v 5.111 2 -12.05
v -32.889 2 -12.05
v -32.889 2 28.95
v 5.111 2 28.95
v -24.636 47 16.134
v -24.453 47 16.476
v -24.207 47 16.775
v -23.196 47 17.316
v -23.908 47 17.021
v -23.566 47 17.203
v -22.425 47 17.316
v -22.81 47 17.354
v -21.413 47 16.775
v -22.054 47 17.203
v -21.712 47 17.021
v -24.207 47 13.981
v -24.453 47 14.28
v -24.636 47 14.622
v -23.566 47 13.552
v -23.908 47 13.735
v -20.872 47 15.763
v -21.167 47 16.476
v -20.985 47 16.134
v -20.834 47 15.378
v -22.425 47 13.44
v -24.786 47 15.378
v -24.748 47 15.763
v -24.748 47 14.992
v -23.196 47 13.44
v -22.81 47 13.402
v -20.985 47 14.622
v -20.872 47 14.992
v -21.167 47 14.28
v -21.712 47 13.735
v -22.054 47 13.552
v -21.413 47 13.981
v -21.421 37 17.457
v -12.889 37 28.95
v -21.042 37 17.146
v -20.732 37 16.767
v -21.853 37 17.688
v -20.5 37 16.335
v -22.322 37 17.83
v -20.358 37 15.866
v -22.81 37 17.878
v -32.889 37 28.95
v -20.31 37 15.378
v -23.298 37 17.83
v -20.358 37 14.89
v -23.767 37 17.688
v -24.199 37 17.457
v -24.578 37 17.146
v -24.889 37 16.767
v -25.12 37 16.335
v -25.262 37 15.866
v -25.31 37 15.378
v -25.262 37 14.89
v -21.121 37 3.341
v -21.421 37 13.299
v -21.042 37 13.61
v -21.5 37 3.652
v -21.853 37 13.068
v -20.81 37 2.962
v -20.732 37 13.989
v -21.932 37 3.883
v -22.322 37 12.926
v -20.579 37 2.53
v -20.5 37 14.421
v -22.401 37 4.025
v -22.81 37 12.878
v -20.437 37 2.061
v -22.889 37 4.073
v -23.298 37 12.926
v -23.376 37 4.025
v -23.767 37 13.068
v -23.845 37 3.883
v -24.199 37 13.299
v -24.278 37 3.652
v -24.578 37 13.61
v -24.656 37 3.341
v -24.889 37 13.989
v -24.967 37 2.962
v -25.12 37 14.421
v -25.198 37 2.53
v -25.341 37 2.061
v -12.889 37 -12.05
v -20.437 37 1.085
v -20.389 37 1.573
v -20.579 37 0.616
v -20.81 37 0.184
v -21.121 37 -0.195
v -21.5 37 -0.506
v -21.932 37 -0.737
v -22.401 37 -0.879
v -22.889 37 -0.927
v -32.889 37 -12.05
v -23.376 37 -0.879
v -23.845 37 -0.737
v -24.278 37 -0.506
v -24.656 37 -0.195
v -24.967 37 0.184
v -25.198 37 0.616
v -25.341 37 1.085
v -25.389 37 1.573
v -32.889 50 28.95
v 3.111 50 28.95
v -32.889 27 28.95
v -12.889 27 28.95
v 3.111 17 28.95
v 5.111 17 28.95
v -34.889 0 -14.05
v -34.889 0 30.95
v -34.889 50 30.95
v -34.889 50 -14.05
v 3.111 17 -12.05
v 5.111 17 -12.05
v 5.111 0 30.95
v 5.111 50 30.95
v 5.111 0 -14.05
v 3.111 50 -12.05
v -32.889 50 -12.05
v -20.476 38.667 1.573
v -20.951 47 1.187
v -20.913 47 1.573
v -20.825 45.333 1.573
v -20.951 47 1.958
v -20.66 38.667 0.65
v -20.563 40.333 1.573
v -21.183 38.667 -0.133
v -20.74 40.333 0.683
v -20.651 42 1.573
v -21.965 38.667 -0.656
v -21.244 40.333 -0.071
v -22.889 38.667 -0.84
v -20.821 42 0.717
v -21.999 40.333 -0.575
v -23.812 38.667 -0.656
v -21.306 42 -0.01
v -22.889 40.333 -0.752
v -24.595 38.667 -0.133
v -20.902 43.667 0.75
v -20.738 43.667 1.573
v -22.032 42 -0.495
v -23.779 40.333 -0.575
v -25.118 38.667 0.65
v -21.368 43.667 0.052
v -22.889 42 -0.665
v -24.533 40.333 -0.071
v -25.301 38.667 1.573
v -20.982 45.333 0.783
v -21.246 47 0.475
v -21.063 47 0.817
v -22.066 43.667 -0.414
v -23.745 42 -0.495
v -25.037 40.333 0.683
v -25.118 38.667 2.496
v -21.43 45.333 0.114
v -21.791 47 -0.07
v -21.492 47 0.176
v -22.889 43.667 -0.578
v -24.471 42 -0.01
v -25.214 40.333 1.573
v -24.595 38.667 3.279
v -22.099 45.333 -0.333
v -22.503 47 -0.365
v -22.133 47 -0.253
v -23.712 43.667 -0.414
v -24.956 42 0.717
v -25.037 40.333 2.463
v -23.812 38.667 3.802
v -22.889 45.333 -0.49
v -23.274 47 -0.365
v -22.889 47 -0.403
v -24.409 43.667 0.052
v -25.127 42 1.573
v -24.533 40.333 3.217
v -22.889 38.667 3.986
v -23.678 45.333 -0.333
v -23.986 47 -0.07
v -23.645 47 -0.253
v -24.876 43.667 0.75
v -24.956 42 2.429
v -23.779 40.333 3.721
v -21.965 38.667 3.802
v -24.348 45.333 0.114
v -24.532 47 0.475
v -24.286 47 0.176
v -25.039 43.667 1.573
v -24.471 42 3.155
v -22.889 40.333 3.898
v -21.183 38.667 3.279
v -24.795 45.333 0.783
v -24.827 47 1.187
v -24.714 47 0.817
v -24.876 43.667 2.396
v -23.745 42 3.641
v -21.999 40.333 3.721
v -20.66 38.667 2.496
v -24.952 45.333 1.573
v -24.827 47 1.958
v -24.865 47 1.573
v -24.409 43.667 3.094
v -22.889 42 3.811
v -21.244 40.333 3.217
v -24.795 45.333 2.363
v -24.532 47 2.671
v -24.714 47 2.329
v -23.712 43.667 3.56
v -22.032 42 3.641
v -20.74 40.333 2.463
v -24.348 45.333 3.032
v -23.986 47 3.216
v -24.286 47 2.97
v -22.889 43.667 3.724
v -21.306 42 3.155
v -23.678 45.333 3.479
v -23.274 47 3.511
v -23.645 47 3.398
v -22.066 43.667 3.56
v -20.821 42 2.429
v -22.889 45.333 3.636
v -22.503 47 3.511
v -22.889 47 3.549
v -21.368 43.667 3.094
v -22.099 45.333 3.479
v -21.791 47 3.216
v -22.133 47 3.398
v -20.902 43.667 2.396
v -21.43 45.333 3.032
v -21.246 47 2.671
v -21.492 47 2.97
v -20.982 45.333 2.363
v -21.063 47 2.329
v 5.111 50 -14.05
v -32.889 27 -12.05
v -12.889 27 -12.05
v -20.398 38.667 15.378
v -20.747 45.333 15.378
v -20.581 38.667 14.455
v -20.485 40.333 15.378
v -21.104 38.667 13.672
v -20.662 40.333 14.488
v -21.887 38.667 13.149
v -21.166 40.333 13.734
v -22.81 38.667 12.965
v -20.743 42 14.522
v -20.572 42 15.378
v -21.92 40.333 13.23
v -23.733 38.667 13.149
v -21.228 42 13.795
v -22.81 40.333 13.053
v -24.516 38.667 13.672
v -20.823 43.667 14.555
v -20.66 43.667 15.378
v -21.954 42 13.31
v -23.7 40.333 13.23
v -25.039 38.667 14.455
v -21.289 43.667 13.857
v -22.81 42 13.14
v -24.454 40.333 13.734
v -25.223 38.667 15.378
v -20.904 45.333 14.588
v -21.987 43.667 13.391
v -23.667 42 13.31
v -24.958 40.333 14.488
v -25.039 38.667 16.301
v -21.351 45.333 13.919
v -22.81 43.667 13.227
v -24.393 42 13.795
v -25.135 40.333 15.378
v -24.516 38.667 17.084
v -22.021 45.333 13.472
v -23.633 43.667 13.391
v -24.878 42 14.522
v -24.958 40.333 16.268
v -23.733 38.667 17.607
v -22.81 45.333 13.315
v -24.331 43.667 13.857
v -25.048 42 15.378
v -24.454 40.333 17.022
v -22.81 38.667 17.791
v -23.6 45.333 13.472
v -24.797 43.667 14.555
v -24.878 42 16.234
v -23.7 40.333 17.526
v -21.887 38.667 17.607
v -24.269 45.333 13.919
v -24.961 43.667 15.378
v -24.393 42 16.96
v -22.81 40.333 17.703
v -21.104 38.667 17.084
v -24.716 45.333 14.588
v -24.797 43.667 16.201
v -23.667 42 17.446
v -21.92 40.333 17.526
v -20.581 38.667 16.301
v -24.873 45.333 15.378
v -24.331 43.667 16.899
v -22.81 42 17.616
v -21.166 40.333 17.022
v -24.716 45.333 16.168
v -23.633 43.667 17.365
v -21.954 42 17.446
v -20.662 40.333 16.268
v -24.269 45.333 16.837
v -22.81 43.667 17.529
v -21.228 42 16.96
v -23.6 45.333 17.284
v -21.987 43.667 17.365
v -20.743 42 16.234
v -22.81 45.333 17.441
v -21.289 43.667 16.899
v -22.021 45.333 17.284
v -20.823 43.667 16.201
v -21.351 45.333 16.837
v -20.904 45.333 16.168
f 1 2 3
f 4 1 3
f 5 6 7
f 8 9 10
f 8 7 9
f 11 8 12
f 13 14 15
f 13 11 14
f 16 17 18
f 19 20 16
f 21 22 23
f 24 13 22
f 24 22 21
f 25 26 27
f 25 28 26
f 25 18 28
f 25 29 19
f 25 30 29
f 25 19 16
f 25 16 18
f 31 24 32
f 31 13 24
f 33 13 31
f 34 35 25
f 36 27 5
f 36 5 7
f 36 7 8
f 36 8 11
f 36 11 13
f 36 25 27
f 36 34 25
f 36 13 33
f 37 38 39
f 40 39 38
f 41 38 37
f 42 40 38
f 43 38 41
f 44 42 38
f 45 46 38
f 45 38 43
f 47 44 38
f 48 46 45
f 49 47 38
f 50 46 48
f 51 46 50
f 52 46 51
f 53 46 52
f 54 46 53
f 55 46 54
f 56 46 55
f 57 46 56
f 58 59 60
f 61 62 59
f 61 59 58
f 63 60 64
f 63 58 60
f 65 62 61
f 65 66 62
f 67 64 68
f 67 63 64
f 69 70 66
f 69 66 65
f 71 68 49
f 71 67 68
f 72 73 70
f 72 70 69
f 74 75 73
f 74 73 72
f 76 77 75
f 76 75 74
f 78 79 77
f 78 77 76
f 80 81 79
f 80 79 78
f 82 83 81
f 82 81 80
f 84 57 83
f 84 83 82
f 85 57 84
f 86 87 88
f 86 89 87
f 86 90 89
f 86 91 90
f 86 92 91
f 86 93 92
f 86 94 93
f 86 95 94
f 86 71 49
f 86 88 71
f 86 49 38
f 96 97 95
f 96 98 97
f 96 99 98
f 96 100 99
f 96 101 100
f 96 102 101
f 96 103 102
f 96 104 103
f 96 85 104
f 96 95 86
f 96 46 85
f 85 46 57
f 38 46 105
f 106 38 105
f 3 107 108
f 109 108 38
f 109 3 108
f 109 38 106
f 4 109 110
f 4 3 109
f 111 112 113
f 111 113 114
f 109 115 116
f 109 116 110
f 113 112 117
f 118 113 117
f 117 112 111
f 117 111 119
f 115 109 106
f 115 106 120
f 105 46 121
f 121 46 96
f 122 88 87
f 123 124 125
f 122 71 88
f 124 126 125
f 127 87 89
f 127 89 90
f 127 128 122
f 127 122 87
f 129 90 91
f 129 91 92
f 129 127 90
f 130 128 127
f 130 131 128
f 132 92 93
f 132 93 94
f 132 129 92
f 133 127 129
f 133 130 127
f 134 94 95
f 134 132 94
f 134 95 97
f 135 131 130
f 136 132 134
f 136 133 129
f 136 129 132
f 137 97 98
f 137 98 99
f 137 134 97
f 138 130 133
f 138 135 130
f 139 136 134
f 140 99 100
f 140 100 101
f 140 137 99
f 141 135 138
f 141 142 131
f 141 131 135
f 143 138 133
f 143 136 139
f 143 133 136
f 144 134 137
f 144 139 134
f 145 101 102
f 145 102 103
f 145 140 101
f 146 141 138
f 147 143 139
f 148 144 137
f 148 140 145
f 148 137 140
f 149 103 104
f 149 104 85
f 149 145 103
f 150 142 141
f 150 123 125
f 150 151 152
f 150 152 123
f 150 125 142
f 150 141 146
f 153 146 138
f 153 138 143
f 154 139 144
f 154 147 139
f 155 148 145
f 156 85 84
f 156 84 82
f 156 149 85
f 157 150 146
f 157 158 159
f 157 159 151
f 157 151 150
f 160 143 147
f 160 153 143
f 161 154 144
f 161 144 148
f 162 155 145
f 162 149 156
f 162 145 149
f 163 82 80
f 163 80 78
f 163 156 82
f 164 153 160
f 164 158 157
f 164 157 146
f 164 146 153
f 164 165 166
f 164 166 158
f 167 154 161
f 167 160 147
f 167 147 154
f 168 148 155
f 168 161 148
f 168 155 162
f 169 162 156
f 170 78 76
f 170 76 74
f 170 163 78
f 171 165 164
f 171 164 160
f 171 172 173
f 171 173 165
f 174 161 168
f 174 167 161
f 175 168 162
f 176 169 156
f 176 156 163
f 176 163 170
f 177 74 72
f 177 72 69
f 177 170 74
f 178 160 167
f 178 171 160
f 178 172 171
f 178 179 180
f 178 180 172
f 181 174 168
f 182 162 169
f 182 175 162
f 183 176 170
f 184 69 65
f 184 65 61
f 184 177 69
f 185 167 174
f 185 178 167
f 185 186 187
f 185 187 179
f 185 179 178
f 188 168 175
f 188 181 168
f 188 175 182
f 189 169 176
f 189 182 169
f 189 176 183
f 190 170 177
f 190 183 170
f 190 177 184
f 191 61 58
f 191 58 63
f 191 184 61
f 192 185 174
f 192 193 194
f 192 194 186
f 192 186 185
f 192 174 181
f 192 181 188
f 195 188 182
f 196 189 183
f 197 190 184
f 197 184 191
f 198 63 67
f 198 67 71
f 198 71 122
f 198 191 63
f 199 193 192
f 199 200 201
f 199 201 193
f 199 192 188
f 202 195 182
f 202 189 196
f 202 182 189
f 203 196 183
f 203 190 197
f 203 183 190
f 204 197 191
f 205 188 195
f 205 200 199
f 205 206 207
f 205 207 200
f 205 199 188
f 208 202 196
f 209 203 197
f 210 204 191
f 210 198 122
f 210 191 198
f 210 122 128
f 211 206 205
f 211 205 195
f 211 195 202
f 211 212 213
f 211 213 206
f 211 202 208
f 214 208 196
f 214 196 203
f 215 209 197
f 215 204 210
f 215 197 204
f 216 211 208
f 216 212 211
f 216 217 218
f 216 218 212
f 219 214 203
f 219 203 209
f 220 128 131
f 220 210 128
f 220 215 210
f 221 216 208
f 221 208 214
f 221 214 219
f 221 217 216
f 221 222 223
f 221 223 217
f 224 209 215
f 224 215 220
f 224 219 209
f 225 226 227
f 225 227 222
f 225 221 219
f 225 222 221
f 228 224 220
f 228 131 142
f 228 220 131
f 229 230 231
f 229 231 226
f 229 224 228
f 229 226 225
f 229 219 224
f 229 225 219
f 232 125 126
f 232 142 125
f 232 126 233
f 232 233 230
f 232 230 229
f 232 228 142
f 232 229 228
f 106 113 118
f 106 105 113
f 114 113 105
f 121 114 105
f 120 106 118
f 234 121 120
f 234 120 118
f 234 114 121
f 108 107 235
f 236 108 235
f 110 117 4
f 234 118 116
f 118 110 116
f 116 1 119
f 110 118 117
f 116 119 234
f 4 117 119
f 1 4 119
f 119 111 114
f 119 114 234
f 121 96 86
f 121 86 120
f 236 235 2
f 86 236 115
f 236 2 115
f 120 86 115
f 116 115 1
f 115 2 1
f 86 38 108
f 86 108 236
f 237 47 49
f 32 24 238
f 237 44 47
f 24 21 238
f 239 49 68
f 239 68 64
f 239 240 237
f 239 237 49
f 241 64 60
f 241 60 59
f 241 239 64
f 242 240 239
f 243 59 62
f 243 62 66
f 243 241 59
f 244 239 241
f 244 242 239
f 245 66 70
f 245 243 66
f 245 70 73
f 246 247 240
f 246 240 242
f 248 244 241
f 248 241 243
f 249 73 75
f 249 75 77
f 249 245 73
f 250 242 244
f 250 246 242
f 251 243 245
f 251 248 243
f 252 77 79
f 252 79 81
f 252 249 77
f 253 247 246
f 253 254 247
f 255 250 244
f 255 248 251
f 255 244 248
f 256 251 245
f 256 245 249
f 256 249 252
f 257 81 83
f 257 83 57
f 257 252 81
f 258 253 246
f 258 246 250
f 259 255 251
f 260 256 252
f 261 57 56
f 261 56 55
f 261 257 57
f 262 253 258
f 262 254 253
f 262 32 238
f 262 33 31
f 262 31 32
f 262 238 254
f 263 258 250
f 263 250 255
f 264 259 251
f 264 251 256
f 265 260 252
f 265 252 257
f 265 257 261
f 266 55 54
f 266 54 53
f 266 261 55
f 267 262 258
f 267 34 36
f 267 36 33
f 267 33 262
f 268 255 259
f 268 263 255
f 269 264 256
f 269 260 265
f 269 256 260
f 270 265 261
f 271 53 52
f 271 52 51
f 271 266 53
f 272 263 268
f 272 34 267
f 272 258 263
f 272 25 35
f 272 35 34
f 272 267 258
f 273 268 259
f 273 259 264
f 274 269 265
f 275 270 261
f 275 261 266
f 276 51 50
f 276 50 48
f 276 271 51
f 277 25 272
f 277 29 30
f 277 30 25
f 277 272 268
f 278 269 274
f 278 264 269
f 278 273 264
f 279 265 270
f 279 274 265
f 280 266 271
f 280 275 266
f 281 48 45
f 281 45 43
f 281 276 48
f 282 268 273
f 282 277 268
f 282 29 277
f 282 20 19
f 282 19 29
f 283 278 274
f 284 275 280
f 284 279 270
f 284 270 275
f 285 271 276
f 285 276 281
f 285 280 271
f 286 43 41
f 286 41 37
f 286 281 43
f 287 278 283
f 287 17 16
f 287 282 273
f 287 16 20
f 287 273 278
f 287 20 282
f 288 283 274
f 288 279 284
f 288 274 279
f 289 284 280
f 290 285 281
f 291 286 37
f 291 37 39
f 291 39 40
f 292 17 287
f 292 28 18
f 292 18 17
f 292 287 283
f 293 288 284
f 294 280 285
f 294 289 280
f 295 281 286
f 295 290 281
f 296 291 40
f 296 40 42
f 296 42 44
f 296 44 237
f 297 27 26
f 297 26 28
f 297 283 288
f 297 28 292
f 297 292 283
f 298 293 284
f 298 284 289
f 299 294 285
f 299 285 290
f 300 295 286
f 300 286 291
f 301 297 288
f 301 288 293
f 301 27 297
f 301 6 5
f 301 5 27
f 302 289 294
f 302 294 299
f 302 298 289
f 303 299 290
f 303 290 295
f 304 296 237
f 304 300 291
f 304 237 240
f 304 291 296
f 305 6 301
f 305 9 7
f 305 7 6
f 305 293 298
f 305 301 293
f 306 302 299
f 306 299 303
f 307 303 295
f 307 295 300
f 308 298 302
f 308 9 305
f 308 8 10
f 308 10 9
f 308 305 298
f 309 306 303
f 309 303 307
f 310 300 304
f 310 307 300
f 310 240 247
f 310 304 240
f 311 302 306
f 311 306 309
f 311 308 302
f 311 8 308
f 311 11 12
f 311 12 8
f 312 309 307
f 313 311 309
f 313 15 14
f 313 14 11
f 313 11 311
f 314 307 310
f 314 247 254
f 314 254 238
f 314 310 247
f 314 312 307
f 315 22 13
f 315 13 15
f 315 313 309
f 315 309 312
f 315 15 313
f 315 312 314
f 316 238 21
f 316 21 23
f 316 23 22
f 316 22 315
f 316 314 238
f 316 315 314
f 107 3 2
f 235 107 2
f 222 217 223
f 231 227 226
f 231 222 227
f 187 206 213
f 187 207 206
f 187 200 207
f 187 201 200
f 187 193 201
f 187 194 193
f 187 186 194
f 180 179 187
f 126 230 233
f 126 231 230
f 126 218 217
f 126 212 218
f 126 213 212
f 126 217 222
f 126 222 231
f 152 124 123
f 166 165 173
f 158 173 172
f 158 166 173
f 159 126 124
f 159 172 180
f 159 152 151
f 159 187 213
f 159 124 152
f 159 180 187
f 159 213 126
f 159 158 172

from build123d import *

# Parameters (mm, degrees)
SKETCH1_W           = 40
SKETCH1_H           = 45
BOSS_EXTRUDE1_DEPTH = 50
SHELL1_T            = -2
SKETCH2_W           = 41
SKETCH2_H           = 15
CUT_EXTRUDE1_DEPTH  = 3
SKETCH4_W           = 41
SKETCH4_H           = 10
BOSS_EXTRUDE2_DEPTH = 20
SKETCH17_R          = 2.5
BOSS_EXTRUDE3_DEPTH = 10
BOSS_EXTRUDE3_TAPER = 3
SKETCH16_R          = 2.5
BOSS_EXTRUDE4_DEPTH = 10
BOSS_EXTRUDE4_TAPER = 3


with BuildPart() as part:
    # Sketch1 → Boss-Extrude1 (new body)
    with BuildSketch(Plane(origin=(0, 0, 0), x_dir=(1, 0, 0), z_dir=(0, 1, 0))):
        with Locations((-14.888700463, -8.449653636)):
            Rectangle(SKETCH1_W, SKETCH1_H)
    extrude(amount=BOSS_EXTRUDE1_DEPTH)

    # Shell1
    shell1_openings = [part.faces().sort_by_distance(p)[0] for p in [
        (-14.888700463, 50, 8.449653636),
    ]]
    offset(amount=SHELL1_T, openings=shell1_openings, kind=Kind.INTERSECTION)

    # Sketch2 → Cut-Extrude1 (cut)
    with BuildSketch(Plane.ZY.offset(-3.111299537)):
        with Locations((8.449653636, 9.5)):
            Rectangle(SKETCH2_W, SKETCH2_H)
    extrude(amount=-CUT_EXTRUDE1_DEPTH, mode=Mode.SUBTRACT)

    # Sketch4 → Boss-Extrude2 (add)
    with BuildSketch(Plane(origin=(-32.888700463, 0, 0), x_dir=(0, 0, -1), z_dir=(1, 0, 0))):
        with Locations((-8.449653636, 32)):
            Rectangle(SKETCH4_W, SKETCH4_H)
    extrude(amount=BOSS_EXTRUDE2_DEPTH)

    # Sketch17 → Boss-Extrude3 (add)
    with BuildSketch(Plane(origin=(0, 37, 0), x_dir=(1, 0, 0), z_dir=(0, 1, 0))):
        with Locations((-22.888700463, -1.572936471)):
            Circle(SKETCH17_R)
    extrude(amount=BOSS_EXTRUDE3_DEPTH, taper=BOSS_EXTRUDE3_TAPER)

    # Sketch16 → Boss-Extrude4 (add)
    with BuildSketch(Plane(origin=(0, 37, 0), x_dir=(1, 0, 0), z_dir=(0, 1, 0))):
        with Locations((-22.81018082, -15.377942678)):
            Circle(SKETCH16_R)
    extrude(amount=BOSS_EXTRUDE4_DEPTH, taper=BOSS_EXTRUDE4_TAPER)


solid = part.part
